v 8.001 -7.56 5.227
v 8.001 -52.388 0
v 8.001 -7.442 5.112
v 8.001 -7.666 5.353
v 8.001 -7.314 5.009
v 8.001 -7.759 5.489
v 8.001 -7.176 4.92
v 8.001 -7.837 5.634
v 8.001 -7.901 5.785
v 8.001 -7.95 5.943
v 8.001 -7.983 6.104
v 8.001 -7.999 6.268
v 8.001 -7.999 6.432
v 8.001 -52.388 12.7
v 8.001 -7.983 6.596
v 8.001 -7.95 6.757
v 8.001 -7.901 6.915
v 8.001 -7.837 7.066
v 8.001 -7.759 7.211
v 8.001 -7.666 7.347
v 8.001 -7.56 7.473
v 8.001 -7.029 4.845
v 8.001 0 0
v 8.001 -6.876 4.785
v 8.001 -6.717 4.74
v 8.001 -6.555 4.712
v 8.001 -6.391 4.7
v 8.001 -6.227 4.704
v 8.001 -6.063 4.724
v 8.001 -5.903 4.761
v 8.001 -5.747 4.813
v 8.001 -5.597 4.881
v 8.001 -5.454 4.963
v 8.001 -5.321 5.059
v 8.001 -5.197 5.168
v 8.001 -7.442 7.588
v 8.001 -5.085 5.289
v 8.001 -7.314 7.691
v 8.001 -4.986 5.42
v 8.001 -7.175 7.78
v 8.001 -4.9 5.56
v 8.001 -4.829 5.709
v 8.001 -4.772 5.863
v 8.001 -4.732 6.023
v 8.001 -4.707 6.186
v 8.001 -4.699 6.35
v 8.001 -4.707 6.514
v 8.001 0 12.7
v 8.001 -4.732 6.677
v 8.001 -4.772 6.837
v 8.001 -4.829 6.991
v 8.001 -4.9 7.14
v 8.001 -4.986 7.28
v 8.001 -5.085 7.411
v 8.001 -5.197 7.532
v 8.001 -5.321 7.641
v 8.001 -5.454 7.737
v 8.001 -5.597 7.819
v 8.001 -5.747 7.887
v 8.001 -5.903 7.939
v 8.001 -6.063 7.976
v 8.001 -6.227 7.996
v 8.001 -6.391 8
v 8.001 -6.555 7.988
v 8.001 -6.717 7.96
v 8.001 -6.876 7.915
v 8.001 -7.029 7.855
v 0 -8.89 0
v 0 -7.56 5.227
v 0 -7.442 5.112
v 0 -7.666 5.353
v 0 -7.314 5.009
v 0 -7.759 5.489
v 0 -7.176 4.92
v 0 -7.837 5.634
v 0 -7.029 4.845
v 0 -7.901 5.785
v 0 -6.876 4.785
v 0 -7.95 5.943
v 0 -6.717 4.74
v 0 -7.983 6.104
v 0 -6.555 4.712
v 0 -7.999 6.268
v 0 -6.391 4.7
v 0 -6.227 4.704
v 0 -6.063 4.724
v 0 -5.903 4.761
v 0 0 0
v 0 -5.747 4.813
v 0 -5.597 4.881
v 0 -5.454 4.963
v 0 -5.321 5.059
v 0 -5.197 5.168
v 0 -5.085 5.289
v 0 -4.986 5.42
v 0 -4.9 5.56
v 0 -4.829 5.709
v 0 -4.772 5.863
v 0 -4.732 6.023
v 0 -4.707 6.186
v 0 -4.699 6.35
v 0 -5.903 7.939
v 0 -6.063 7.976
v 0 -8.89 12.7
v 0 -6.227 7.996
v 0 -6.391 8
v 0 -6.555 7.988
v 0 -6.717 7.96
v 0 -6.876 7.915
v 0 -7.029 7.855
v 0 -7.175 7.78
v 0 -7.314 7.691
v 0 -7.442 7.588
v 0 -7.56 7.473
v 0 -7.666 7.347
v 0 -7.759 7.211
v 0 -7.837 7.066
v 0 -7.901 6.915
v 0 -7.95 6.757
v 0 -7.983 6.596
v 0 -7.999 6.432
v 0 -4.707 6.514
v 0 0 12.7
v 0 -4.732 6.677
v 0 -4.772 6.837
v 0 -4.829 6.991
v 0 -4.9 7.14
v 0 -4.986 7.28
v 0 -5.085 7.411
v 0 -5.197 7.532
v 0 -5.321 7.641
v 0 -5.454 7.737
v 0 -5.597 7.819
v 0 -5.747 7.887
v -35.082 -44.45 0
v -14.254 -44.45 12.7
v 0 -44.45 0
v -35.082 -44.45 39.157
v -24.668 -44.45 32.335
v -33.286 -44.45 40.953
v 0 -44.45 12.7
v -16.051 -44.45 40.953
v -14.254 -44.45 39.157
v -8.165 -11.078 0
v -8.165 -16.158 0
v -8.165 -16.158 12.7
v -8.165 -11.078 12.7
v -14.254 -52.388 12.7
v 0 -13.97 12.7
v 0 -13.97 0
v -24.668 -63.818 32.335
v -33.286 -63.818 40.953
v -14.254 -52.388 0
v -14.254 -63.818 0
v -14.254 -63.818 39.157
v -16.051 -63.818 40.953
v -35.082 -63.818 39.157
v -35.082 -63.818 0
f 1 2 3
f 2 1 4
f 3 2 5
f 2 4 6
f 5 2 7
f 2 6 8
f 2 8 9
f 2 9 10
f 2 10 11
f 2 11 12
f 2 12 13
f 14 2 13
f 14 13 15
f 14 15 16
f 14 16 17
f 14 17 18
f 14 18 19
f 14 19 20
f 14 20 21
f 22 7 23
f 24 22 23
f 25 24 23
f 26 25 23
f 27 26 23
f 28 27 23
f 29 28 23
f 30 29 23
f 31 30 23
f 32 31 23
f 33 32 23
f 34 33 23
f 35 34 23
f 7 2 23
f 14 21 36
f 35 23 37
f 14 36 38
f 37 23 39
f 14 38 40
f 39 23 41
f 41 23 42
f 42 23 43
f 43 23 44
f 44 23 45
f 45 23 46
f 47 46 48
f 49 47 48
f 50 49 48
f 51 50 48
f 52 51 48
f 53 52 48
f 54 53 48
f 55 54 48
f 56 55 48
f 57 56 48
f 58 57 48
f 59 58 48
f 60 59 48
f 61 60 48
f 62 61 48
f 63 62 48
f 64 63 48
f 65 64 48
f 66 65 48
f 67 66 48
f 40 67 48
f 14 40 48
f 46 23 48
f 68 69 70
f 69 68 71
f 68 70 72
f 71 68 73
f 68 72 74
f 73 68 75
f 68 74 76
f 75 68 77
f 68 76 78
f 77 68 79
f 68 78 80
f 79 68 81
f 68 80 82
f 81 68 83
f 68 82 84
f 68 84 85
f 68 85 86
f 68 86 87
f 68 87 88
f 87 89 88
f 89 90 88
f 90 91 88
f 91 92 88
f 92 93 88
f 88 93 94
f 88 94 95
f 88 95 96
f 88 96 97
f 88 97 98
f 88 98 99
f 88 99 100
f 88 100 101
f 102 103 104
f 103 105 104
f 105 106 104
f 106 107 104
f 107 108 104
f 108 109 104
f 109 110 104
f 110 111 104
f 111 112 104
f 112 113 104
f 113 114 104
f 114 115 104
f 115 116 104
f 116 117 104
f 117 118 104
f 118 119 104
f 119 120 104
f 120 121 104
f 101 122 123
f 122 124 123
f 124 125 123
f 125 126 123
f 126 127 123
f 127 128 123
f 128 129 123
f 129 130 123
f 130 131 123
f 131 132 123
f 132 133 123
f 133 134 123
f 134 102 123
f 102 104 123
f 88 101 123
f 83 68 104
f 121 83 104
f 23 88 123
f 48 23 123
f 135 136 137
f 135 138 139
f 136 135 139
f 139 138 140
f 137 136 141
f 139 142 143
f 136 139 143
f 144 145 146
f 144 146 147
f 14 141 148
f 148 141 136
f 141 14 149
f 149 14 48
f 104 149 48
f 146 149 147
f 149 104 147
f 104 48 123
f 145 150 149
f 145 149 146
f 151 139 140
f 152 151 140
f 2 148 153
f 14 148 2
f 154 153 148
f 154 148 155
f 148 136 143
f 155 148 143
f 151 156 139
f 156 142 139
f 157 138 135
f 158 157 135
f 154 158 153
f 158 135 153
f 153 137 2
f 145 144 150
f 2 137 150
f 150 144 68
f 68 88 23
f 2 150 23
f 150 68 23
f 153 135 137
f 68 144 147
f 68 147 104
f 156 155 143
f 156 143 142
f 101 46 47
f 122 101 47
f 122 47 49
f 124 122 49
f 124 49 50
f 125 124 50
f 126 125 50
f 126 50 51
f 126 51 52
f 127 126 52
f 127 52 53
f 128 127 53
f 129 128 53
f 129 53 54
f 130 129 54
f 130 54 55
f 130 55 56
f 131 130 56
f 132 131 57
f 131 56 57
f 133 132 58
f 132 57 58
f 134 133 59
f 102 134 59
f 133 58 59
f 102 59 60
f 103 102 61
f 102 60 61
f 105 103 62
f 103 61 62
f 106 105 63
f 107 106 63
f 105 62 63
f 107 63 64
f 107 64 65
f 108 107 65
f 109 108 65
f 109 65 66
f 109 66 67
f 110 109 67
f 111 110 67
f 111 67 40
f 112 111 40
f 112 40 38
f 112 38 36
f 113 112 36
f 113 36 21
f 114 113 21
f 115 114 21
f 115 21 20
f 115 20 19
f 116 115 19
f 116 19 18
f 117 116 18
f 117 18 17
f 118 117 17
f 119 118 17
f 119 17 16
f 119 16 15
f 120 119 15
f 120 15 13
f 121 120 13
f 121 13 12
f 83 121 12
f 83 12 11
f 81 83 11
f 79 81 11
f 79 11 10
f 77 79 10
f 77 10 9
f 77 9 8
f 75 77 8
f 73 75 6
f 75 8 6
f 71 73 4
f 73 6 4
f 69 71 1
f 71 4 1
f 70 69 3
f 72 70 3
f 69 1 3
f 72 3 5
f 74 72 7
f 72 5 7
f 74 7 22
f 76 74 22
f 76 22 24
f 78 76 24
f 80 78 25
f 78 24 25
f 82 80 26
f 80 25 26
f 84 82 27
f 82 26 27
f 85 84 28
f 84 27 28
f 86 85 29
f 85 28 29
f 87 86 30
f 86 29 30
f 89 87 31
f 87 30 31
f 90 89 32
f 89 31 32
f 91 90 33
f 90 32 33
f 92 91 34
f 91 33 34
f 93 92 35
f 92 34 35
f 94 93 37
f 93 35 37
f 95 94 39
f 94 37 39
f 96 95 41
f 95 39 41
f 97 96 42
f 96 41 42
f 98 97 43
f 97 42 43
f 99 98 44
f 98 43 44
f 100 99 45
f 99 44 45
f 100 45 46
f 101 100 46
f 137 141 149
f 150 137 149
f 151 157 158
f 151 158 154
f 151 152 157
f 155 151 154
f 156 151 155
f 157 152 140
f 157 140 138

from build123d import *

# Parameters (mm, degrees)
F0_W          = 44.45
F0_H          = 12.7
F1_DEPTH      = 8.001
F3_DEPTH      = 7.9375
F5_DEPTH      = 7.9375
F5_DEPTH_BACK = 11.43
F6_R          = 1.651
F7_DEPTH      = 25.4
F9_DEPTH      = 12.7


with BuildPart() as f1:
    # F0 (on Right) → F1 (new body)
    with BuildSketch(Plane.YZ):
        with Locations((-22.225, 6.35)):
            Rectangle(F0_W, F0_H)
    extrude(amount=F1_DEPTH)

    # F2 (on face) → F3 (join)
    with BuildSketch(Plane.XZ.offset(44.45)):
        Polygon((8.001, 12.7), (0, 12.7), (-35.08248, 12.7), (-35.08248, 0), (0, 0), (8.001, 0), align=None)
    extrude(amount=F3_DEPTH)

    # F4 (on face) → F5 (join, two sides)
    with BuildSketch(Plane.XZ.offset(52.3875)) as f5_sk:
        Polygon((-35.08248, 39.1567536341), (-35.08248, 0), (-14.25448, 0), (-14.25448, 39.1567536341), (-16.0505312242, 40.9528048583), (-24.66848, 32.3348560825), (-33.2864287758, 40.9528048583), align=None)
    extrude(amount=-F5_DEPTH)
    extrude(f5_sk.sketch, amount=F5_DEPTH_BACK)

    # F6 (on face) → F7 (cut)
    with BuildSketch(Plane.YZ.offset(8.001)):
        with Locations((-6.35, 6.35)):
            Circle(F6_R)
    extrude(amount=-F7_DEPTH, mode=Mode.SUBTRACT)

    # F8 (on face) → F9 (join, through all)
    with BuildSketch(Plane(origin=(0, 0, 0), x_dir=(1, 0, 0), z_dir=(0, 0, -1))):
        Polygon((-8.1650869207, 11.0778284465), (0, 8.89), (0, 13.97), (-8.1650869207, 16.1578284465), align=None)
    extrude(amount=-F9_DEPTH)


solid = f1.part
